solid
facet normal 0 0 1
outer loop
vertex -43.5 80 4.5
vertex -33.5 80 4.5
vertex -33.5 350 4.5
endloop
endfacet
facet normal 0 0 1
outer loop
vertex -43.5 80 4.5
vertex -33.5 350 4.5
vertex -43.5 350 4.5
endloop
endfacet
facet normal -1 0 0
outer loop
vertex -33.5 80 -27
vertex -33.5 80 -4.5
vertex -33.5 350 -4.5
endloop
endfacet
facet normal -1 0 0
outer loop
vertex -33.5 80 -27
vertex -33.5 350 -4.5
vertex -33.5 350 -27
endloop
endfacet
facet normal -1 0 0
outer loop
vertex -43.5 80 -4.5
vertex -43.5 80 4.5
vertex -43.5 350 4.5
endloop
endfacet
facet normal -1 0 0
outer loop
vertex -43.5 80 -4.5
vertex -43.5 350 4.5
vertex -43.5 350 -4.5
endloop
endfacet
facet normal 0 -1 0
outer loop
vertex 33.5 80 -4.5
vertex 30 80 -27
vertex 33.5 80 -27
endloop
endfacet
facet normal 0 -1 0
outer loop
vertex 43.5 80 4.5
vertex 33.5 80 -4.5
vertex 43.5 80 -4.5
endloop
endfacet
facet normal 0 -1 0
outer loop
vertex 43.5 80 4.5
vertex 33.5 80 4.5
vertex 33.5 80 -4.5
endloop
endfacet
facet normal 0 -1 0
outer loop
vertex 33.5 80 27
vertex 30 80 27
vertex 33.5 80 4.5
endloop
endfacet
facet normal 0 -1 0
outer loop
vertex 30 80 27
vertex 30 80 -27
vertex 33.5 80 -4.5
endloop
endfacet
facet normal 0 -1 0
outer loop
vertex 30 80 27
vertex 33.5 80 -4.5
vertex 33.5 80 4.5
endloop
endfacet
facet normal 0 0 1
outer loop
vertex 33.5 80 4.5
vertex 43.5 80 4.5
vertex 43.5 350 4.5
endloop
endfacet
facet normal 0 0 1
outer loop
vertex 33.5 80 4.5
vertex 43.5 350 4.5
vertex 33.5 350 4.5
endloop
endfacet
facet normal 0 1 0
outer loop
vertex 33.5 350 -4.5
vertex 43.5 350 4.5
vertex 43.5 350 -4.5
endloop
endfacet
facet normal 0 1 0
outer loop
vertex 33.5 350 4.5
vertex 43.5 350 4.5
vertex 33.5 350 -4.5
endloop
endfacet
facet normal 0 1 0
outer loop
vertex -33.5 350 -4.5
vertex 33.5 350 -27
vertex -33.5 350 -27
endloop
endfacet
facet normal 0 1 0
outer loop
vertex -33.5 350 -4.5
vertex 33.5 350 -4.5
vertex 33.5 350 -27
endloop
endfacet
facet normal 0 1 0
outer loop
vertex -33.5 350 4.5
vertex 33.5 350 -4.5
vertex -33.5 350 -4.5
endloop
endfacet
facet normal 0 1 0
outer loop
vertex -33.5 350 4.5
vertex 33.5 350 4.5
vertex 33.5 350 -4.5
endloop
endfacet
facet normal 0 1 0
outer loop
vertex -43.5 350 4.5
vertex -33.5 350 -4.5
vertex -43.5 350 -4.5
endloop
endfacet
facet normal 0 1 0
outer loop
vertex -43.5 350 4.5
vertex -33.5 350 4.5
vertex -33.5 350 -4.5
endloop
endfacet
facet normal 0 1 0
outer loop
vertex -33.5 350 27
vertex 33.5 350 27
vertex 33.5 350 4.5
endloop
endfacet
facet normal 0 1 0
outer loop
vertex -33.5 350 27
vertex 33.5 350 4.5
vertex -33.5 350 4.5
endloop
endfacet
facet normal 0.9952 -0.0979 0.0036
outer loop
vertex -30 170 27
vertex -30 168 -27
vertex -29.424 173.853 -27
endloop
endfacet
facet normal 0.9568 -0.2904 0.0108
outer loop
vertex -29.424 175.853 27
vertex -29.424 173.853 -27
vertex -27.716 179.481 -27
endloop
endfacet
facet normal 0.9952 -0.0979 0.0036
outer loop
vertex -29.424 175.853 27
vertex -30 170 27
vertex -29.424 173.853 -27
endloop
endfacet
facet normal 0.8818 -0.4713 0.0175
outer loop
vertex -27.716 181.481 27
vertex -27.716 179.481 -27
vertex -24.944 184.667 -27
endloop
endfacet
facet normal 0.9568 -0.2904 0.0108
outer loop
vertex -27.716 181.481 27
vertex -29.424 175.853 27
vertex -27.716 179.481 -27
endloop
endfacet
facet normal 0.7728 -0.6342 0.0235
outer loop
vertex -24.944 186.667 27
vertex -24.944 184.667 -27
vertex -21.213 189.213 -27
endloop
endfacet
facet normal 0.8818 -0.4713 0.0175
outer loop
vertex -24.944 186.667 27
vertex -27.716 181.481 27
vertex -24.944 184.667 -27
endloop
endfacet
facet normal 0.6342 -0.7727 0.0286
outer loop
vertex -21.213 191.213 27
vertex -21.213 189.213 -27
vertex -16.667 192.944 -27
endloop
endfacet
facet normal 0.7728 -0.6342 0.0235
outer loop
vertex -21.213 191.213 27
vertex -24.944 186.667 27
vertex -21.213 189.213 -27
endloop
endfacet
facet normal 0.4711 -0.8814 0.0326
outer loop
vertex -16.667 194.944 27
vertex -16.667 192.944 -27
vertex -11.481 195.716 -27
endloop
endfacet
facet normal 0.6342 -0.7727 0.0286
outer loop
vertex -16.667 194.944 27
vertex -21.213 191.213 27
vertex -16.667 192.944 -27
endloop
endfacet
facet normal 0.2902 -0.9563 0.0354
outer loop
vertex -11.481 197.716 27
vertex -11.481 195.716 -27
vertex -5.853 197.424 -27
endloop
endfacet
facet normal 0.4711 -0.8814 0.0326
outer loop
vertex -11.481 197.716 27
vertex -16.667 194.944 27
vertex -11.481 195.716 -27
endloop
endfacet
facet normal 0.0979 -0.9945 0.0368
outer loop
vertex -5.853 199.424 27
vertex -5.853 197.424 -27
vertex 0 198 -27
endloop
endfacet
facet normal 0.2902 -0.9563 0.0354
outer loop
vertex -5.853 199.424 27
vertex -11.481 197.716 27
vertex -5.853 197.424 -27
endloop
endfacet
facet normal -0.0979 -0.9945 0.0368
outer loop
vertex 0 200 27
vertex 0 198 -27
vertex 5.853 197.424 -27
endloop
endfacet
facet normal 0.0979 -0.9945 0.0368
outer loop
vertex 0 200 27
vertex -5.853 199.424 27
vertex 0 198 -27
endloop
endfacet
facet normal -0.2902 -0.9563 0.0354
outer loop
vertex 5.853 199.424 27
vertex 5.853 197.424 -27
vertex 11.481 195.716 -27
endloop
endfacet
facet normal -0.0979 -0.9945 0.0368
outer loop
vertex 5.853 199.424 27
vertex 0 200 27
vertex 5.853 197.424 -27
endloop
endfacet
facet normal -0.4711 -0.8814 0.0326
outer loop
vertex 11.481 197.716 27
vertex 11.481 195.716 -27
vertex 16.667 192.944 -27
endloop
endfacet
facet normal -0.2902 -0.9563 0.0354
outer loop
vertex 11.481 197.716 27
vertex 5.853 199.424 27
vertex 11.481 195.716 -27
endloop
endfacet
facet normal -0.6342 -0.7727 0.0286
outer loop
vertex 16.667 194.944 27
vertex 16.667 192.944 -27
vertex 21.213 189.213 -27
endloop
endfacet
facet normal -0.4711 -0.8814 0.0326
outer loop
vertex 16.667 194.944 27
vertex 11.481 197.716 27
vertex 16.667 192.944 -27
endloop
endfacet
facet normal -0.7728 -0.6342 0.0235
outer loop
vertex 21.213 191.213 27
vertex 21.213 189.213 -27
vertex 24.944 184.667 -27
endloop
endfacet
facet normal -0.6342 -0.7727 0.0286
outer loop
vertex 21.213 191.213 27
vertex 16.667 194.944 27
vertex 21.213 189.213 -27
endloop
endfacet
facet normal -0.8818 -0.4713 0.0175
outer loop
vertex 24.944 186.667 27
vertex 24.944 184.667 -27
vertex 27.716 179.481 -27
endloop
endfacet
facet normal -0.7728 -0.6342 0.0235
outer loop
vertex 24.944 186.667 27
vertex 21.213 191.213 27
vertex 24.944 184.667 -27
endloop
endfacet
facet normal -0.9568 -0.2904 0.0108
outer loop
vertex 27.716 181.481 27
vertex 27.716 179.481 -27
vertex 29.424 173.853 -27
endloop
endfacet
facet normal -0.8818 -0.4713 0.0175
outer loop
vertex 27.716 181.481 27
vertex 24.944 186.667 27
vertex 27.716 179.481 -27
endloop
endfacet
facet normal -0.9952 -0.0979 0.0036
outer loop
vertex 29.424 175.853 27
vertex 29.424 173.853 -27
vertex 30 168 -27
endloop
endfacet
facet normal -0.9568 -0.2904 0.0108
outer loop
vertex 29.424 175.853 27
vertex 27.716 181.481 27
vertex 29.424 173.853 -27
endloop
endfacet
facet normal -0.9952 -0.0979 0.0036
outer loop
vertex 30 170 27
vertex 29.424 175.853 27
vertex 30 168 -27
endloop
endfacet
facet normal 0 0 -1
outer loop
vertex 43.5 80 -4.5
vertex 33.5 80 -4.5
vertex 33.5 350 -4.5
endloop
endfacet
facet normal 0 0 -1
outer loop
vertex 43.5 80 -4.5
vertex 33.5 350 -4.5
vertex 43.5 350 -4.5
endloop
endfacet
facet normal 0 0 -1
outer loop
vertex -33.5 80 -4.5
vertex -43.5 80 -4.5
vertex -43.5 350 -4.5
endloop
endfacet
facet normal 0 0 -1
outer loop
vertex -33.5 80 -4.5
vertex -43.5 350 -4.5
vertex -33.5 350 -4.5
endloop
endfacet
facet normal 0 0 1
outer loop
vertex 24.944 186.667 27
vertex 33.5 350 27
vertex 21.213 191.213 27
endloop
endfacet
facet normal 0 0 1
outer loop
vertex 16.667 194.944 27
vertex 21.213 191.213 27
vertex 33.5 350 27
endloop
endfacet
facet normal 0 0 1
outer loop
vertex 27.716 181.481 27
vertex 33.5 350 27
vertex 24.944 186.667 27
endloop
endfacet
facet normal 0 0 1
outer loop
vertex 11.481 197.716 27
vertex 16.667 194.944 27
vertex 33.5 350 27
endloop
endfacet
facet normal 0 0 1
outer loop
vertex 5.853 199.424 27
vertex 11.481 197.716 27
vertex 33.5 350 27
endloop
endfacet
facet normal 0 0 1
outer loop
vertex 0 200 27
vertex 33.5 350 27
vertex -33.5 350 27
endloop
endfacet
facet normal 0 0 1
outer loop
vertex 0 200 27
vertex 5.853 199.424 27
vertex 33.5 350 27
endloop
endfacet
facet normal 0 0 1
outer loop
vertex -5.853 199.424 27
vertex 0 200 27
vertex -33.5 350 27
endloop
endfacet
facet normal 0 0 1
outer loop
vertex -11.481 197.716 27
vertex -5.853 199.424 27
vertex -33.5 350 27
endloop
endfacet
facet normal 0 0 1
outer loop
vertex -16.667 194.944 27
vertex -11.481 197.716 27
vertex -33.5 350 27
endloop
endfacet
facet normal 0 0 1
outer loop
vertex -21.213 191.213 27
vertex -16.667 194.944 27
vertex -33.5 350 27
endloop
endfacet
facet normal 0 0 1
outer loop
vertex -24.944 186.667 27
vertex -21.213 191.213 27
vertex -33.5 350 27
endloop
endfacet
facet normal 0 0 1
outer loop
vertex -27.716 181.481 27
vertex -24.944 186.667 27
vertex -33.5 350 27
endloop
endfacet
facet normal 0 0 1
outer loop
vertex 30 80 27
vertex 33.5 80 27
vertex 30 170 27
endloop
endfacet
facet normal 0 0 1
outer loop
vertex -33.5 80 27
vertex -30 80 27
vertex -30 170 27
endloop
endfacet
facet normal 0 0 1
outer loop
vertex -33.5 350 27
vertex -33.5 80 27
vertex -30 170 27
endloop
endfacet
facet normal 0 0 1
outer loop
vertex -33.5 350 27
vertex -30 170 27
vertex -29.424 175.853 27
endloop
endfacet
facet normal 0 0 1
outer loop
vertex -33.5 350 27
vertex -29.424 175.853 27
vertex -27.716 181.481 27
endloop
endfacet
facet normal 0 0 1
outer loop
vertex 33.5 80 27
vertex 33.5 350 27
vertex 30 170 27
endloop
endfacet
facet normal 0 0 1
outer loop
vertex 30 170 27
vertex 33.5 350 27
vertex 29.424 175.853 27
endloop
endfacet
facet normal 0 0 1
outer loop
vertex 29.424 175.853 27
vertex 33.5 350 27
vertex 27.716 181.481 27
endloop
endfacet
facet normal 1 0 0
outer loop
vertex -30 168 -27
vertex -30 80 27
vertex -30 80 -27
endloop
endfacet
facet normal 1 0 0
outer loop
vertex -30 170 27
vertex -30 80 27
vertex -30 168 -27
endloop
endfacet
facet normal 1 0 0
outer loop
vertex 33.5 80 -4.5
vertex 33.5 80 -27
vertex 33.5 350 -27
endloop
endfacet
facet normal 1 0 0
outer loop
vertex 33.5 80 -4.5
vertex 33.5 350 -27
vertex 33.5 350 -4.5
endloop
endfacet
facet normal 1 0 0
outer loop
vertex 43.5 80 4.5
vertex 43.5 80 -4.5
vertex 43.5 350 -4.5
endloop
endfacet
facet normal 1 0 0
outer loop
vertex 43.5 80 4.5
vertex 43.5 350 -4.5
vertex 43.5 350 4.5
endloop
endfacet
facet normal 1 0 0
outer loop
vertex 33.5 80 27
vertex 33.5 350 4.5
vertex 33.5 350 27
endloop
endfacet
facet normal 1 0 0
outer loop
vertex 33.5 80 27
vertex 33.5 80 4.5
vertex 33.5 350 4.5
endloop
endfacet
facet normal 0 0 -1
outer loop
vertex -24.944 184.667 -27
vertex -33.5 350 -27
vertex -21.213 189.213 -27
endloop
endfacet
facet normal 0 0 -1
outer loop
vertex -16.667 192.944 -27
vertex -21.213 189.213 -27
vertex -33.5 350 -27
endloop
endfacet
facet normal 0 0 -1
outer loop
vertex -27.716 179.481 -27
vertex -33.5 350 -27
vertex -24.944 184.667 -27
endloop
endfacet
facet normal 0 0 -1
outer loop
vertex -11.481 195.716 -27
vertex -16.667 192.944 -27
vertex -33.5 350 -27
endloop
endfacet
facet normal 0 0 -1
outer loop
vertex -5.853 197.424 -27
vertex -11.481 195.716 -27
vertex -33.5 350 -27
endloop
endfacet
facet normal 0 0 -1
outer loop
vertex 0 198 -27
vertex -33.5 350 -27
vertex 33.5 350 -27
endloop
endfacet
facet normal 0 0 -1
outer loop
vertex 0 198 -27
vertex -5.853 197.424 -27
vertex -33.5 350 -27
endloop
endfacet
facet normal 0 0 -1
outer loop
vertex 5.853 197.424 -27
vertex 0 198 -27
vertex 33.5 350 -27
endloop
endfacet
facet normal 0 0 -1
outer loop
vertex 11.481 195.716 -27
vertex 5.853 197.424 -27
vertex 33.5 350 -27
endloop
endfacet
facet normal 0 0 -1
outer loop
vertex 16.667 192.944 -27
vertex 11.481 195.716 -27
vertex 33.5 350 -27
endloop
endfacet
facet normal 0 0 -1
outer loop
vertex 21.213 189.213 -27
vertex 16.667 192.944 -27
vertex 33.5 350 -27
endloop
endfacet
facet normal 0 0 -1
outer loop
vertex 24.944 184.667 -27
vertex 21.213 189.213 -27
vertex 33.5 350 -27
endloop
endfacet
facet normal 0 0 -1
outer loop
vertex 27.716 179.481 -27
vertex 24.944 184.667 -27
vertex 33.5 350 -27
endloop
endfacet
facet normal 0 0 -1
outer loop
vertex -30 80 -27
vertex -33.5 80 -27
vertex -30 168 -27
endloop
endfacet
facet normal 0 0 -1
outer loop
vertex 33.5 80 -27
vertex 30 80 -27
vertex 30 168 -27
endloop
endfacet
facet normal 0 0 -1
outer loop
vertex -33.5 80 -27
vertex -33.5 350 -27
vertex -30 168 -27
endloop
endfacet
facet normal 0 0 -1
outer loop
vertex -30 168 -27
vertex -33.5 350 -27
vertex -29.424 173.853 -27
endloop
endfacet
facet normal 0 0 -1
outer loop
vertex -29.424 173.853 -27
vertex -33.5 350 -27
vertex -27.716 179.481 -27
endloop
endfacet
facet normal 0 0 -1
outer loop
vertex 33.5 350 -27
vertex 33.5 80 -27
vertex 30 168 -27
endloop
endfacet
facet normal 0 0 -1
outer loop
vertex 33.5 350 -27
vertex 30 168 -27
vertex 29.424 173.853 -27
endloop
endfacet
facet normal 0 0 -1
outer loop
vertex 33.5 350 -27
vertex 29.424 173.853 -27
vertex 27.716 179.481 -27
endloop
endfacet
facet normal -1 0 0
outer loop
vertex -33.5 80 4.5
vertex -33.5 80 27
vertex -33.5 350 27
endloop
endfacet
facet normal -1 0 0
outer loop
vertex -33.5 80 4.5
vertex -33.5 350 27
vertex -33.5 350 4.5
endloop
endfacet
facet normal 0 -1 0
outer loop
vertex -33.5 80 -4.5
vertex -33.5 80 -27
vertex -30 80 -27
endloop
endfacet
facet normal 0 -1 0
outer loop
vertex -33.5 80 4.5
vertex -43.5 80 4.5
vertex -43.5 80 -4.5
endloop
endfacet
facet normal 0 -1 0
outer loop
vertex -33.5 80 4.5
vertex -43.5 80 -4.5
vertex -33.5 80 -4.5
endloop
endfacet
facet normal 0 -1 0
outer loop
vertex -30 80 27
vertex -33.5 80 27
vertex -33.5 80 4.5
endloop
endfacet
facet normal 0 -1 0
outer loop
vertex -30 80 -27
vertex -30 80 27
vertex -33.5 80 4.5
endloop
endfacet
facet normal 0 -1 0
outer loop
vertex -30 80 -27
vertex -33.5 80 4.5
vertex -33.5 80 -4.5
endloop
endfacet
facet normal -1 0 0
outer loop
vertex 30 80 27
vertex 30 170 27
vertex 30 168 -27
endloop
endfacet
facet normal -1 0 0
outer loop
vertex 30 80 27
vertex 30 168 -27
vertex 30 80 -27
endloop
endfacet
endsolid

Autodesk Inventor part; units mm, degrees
ref_plane "YZ Plane" through (0, 0, 0) normal (1, 0, 0) x (0, 1, 0)
ref_plane "XZ Plane" through (0, 0, 0) normal (0, 1, 0) x (-1, 0, 0)
ref_plane "XY Plane" through (0, 0, 0) normal (0, 0, 1) x (1, 0, 0)
sketch "草圖1" plane through (0, 0, 0) normal (0, 1, 0) x (-1, 0, 0)
  line L0 (-33.5, 27) -> (33.5, 27)
  line L1 (33.5, 27) -> (33.5, -27)
  line L2 (33.5, -27) -> (-33.5, -27)
  line L3 (-33.5, -27) -> (-33.5, 27)
  line L4 (-33.5, 27) -> (33.5, -27) construction
  line L5 (33.5, 27) -> (-33.5, -27) construction
  line L6 (43.5, -4.5) -> (33.5, -4.5)
  line L7 (33.5, -4.5) -> (33.5, 4.5)
  line L8 (33.5, 4.5) -> (43.5, 4.5)
  line L9 (43.5, 4.5) -> (43.5, -4.5)
  line L10 (-33.5, -4.5) -> (-43.5, -4.5)
  line L11 (-43.5, -4.5) -> (-43.5, 4.5)
  line L12 (-43.5, 4.5) -> (-33.5, 4.5)
  line L13 (-33.5, 4.5) -> (-33.5, -4.5)
  point P0 (0, 0)
  point P1 (33.5, 0)
  point P2 (-33.5, 0)
  point P3 (-33.5, 4.5)
  point P4 (-33.5, -4.5)
  dimension "d0" = 67
  dimension "d1" = 54
  dimension "d2" = 9
  dimension "d3" = 10
extrude "擠出1" add sketch "草圖1" along normal blind 350
sketch "草圖2" plane through (-33.5, 0, 27) normal (0, 0, 1) x (1, 0, 0)
  line L0 (0, 0) -> (0, 350) projected
  line L1 (0, 350) -> (67, 350) projected
  line L2 (67, 350) -> (67, 0) projected
  line L3 (67, 0) -> (0, 0) projected
  circle A0 centre (33.5, 148) radius 30
  line L4 (3.5, 148) -> (63.5, 148)
  line L5 (63.5, 148) -> (63.5, -3.654)
  line L6 (63.5, -3.654) -> (3.5, -3.654)
  line L7 (3.5, -3.654) -> (3.5, 148)
  point P0 (33.5, 0)
  point P1 (33.5, 0)
  point P2 (63.5, 148)
  point P3 (3.5, 148)
  dimension "d6" = 148
  dimension "d7" = 60
extrude "擠出2" cut sketch "草圖2" against normal through all contours L7 A0 L5 L3 | L3 L5 L6 L7 | L4 A0 | A0 L4
sketch "草圖3" plane through (-33.5, 350, 27) normal (0, 0, 1) x (1, 0, 0)
  line L0 (-135.2961, -270) -> (202.2961, -270)
  line L1 (202.2961, -270) -> (202.2961, -350)
  line L2 (202.2961, -350) -> (-135.2961, -350)
  line L3 (-135.2961, -350) -> (-135.2961, -270)
  point P0 (33.5, -350)
  point P1 (33.5, -350)
  dimension "d10" = 80
extrude "擠出3" cut sketch "草圖3" against normal through all
sketch "草圖4" plane through (33.5, 350, -27) normal (0, 0, -1) x (-1, 0, 0)
  arc A0 (63.5, -202) -> (3.5, -202) centre (33.5, -202) ccw construction
  circle A1 centre (33.5, -182) radius 30
  line L0 (63.5, -270) -> (3.5, -270)
  line L1 (3.5, -270) -> (3.5, -182)
  line L2 (3.5, -182) -> (63.5, -182)
  line L3 (63.5, -182) -> (63.5, -270)
  line L4 (63.5, -270) -> (67, -270) projected
  point P0 (33.5, -350)
  point P1 (65.25, -270)
  dimension "d13" = 20
  dimension "d14" = 60
sketch "草圖5" plane through (-33.5, 350, 27) normal (0, 0, 1) x (1, 0, 0)
  arc A0 (63.5, -202) -> (3.5, -202) centre (33.5, -202) ccw construction
  circle A1 centre (33.5, -180) radius 30
  line L0 (63.5, -270) -> (3.5, -270)
  line L1 (3.5, -270) -> (3.5, -180)
  line L2 (3.5, -180) -> (63.5, -180)
  line L3 (63.5, -180) -> (63.5, -270)
  point P0 (33.5, -350)
  point P1 (63.5, -270)
  dimension "d15" = 22
  dimension "d16" = 60
loft "斷面混成1" cut profiles "草圖4", "草圖5"
properties part number "Slider-6"
